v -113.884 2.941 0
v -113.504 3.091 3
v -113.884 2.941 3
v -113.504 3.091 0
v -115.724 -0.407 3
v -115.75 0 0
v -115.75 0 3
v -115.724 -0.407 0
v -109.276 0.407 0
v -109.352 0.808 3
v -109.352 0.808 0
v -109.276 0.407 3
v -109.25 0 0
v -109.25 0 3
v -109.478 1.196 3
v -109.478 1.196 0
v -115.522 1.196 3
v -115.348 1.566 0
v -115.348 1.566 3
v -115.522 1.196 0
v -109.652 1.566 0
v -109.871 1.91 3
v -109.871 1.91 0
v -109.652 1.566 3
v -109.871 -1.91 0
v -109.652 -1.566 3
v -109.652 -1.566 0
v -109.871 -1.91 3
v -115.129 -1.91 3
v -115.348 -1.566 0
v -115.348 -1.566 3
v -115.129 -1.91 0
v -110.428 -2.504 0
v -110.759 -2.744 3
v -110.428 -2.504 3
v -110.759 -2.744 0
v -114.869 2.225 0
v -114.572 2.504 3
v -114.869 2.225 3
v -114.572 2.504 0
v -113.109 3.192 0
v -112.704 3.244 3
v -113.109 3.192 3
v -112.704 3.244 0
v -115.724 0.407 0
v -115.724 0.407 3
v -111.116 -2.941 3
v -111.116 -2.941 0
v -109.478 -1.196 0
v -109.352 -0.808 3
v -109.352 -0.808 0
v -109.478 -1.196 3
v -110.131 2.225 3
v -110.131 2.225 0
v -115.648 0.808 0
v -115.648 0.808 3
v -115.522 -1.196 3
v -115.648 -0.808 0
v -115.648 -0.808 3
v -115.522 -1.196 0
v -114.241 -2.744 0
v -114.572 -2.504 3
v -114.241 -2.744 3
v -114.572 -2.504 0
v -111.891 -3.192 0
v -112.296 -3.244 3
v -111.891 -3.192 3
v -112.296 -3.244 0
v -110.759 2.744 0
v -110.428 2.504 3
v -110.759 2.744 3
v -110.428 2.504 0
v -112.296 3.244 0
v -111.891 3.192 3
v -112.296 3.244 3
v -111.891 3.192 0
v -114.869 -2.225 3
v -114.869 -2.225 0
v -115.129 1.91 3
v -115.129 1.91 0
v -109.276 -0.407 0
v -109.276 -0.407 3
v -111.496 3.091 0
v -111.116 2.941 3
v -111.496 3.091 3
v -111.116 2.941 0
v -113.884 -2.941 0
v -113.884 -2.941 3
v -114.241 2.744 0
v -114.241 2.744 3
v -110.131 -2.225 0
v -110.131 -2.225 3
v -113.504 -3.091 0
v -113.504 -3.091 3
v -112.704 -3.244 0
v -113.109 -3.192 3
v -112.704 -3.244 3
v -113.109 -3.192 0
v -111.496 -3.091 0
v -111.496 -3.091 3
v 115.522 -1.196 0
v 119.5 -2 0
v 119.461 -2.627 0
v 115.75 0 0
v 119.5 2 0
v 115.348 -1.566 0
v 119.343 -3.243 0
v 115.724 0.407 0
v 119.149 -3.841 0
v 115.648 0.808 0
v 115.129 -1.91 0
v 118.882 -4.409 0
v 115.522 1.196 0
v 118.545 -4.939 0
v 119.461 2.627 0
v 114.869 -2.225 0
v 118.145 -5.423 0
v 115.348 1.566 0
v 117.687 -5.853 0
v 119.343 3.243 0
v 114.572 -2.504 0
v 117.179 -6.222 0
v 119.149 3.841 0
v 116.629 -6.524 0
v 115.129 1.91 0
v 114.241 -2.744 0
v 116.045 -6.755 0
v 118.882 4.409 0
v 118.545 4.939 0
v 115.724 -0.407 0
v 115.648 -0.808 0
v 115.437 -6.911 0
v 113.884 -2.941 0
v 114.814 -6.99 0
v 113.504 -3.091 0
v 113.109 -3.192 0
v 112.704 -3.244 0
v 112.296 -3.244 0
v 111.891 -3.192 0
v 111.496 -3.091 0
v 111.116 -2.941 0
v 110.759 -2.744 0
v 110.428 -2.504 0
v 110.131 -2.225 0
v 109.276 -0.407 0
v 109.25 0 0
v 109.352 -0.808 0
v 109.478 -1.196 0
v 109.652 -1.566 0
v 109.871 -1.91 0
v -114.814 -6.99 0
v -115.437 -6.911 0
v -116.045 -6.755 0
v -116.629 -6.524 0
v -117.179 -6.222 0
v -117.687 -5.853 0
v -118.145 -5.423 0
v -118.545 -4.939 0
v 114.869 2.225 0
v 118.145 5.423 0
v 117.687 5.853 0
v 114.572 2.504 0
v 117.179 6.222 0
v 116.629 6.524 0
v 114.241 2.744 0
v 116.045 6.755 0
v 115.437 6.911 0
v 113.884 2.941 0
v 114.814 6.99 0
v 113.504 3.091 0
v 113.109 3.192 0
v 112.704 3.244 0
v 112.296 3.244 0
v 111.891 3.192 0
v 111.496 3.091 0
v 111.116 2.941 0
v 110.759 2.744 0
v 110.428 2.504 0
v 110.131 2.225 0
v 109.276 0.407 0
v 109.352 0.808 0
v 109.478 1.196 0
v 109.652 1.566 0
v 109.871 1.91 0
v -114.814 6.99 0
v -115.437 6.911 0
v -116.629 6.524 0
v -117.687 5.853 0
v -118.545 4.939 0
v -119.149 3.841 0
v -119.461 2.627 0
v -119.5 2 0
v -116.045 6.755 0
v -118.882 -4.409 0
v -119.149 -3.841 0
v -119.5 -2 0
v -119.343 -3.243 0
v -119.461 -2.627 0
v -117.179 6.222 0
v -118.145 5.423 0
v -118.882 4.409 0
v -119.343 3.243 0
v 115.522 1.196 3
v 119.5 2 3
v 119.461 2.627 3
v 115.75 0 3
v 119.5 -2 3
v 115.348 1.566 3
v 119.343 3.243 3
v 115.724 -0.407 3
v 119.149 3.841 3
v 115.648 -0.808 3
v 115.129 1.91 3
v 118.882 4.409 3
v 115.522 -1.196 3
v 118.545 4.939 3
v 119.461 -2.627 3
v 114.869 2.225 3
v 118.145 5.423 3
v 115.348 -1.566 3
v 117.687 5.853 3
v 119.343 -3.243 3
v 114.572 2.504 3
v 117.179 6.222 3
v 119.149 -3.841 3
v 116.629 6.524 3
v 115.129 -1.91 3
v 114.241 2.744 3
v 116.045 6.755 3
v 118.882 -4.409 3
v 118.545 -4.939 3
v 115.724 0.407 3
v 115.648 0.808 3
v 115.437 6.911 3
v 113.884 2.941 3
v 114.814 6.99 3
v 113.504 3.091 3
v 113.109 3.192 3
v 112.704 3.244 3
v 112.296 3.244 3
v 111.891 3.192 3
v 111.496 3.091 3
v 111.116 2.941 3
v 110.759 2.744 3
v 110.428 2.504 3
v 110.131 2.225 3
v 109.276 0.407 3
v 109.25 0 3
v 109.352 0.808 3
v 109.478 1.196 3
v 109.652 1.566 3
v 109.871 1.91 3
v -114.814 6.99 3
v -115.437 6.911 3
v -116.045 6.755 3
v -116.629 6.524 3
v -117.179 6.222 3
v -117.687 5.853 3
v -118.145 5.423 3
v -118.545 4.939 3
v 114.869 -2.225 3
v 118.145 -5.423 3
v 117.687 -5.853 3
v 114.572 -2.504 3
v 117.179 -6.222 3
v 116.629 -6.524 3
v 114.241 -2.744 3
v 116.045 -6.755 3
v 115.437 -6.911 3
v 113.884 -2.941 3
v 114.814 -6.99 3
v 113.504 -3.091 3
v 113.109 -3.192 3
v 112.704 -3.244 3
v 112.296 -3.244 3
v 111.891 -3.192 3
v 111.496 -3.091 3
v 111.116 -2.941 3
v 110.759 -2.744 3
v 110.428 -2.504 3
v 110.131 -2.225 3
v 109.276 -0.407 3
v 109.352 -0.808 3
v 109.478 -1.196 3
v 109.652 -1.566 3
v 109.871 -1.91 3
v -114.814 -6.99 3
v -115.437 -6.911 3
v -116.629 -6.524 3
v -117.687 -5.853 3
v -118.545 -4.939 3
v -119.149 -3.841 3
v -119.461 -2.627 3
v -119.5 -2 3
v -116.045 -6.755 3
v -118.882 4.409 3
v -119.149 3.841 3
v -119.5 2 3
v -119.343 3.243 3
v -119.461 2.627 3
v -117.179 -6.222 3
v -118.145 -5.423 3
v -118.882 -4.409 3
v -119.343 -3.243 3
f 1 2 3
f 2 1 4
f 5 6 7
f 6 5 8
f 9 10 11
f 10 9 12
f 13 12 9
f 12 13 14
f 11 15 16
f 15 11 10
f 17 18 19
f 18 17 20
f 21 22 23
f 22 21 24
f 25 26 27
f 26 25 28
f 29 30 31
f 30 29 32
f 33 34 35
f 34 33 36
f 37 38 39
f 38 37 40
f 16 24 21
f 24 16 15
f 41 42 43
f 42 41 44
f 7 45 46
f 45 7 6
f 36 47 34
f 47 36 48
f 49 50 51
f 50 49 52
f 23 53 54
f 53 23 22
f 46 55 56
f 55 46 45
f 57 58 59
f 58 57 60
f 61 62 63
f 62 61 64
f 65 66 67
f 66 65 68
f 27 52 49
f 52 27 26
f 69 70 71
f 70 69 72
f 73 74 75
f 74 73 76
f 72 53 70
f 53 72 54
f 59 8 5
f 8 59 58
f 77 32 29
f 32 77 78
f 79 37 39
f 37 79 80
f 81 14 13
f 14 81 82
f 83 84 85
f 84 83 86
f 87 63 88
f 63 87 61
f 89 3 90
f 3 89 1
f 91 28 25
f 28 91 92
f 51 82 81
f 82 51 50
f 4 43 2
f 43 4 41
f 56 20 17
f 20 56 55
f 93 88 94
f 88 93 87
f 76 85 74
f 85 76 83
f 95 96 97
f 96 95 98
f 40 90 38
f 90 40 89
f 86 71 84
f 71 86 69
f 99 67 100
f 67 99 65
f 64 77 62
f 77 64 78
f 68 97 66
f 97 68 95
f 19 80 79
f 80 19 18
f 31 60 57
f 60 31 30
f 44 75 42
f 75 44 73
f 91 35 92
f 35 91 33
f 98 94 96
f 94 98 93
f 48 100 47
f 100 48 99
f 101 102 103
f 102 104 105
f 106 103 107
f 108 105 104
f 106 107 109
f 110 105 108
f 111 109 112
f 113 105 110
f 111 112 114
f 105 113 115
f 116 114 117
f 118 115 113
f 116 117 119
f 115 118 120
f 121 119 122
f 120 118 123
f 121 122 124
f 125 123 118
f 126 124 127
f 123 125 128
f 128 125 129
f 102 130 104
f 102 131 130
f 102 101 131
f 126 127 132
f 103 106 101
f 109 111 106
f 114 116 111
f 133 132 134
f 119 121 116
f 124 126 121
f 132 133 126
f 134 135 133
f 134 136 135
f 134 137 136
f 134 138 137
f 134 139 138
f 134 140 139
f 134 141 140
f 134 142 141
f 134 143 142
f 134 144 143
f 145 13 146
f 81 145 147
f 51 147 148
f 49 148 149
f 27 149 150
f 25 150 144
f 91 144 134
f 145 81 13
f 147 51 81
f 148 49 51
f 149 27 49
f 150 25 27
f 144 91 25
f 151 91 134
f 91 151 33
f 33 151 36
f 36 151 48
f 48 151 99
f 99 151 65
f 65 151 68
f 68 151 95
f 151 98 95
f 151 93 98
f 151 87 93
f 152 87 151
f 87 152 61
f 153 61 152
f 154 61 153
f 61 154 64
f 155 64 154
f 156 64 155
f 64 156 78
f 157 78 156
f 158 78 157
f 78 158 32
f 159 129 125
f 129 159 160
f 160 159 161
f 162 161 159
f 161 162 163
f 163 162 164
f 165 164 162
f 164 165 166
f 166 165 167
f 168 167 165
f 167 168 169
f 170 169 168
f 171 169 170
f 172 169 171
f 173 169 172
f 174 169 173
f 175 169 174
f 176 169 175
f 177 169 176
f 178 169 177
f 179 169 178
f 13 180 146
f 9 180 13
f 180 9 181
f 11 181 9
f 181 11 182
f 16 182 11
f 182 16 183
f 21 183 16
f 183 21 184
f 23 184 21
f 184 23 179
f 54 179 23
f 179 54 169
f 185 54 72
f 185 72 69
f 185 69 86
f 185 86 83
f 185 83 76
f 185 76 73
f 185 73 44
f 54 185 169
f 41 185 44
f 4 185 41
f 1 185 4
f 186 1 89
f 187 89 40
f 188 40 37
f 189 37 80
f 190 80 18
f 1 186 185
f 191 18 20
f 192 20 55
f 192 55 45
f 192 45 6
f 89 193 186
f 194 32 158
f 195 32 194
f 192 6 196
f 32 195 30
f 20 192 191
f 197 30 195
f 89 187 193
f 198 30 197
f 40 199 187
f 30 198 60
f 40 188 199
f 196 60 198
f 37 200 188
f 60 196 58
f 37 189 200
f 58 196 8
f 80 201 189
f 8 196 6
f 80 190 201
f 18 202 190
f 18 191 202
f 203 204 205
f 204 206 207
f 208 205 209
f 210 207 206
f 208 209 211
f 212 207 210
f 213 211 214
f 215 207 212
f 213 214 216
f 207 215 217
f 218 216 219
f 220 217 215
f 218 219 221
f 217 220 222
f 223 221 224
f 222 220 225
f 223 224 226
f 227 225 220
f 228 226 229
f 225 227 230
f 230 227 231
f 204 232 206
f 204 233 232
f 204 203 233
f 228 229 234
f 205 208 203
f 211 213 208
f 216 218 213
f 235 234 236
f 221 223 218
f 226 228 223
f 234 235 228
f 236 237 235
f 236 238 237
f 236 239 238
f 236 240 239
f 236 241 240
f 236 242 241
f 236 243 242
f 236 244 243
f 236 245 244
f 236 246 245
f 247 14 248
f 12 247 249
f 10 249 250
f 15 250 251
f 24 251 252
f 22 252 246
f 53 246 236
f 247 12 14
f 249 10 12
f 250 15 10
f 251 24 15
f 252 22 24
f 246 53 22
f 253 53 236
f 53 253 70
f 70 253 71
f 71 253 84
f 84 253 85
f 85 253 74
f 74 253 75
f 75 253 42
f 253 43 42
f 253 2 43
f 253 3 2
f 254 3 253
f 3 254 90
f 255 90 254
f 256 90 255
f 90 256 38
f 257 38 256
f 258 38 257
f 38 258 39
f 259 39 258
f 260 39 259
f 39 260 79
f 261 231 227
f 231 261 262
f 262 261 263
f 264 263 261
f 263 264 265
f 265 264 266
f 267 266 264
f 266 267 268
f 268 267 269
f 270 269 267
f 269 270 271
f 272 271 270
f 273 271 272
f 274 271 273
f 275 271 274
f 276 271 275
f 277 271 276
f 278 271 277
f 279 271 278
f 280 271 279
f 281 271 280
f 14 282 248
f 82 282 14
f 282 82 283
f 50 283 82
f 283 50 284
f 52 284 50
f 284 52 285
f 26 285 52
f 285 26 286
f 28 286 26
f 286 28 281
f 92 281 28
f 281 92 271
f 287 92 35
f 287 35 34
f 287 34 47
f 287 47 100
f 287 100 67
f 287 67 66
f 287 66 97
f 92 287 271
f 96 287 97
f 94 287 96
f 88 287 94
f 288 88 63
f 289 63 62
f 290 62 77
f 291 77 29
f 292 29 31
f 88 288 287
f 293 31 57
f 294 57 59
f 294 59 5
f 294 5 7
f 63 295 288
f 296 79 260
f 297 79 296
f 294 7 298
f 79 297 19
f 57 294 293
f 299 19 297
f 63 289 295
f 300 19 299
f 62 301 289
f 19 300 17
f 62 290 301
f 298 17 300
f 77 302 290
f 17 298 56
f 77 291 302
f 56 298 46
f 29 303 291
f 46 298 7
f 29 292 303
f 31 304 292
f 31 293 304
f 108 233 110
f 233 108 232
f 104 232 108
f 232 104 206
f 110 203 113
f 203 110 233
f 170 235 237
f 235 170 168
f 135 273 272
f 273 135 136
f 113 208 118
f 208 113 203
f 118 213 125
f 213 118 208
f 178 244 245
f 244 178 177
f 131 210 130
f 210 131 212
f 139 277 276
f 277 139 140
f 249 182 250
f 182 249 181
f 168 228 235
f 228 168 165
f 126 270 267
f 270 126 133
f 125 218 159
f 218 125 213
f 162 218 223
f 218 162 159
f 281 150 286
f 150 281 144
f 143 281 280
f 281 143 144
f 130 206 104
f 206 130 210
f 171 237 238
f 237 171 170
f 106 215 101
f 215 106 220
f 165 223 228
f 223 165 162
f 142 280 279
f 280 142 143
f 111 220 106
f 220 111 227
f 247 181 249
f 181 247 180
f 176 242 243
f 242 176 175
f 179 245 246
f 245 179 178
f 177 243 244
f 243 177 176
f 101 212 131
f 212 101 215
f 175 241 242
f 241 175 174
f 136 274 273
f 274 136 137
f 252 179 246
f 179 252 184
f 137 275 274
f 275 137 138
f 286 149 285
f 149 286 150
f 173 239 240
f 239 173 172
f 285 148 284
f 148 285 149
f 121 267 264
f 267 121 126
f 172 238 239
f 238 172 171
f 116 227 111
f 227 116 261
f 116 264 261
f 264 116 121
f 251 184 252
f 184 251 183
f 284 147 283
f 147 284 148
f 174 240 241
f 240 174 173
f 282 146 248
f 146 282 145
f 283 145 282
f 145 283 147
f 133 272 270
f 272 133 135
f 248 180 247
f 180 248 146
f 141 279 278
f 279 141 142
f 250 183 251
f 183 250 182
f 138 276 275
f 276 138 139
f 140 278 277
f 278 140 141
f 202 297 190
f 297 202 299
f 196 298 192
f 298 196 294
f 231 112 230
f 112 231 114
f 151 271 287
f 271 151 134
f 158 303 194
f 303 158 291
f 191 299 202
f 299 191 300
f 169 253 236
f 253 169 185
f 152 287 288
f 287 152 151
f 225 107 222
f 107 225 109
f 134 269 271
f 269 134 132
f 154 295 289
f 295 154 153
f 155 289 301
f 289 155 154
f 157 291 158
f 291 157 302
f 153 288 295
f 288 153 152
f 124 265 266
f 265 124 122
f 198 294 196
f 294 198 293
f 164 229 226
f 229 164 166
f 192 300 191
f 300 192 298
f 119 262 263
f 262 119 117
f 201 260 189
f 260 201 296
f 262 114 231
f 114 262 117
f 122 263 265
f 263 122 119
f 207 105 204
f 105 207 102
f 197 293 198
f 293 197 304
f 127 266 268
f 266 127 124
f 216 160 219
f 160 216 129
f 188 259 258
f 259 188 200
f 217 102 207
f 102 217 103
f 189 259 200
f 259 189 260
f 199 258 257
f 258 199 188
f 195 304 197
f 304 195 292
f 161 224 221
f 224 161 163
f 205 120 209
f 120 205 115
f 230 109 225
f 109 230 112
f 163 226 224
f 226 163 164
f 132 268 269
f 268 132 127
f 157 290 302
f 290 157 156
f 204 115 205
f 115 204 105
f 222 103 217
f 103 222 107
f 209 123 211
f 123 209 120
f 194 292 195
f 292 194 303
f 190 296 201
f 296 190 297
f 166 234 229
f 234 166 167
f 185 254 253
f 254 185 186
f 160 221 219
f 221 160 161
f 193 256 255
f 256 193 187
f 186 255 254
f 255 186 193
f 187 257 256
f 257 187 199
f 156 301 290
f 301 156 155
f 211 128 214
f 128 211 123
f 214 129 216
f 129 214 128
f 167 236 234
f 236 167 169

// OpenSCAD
$fn = 50;


difference() {
	union() {
		hull() {
			translate(v = [-114.5000000000, 2.0000000000, 0]) {
				cylinder(h = 3, r = 5);
			}
			translate(v = [114.5000000000, 2.0000000000, 0]) {
				cylinder(h = 3, r = 5);
			}
			translate(v = [-114.5000000000, -2.0000000000, 0]) {
				cylinder(h = 3, r = 5);
			}
			translate(v = [114.5000000000, -2.0000000000, 0]) {
				cylinder(h = 3, r = 5);
			}
		}
	}
	union() {
		translate(v = [-112.5000000000, 0.0000000000, 0]) {
			cylinder(h = 3, r = 3.2500000000);
		}
		translate(v = [112.5000000000, 0.0000000000, 0]) {
			cylinder(h = 3, r = 3.2500000000);
		}
		translate(v = [-112.5000000000, 0.0000000000, 0]) {
			cylinder(h = 3, r = 1.8000000000);
		}
		translate(v = [112.5000000000, 0.0000000000, 0]) {
			cylinder(h = 3, r = 1.8000000000);
		}
		translate(v = [-112.5000000000, 0.0000000000, 0]) {
			cylinder(h = 3, r = 1.8000000000);
		}
		translate(v = [112.5000000000, 0.0000000000, 0]) {
			cylinder(h = 3, r = 1.8000000000);
		}
		translate(v = [-112.5000000000, 0.0000000000, 0]) {
			cylinder(h = 3, r = 1.8000000000);
		}
		translate(v = [112.5000000000, 0.0000000000, 0]) {
			cylinder(h = 3, r = 1.8000000000);
		}
	}
}
